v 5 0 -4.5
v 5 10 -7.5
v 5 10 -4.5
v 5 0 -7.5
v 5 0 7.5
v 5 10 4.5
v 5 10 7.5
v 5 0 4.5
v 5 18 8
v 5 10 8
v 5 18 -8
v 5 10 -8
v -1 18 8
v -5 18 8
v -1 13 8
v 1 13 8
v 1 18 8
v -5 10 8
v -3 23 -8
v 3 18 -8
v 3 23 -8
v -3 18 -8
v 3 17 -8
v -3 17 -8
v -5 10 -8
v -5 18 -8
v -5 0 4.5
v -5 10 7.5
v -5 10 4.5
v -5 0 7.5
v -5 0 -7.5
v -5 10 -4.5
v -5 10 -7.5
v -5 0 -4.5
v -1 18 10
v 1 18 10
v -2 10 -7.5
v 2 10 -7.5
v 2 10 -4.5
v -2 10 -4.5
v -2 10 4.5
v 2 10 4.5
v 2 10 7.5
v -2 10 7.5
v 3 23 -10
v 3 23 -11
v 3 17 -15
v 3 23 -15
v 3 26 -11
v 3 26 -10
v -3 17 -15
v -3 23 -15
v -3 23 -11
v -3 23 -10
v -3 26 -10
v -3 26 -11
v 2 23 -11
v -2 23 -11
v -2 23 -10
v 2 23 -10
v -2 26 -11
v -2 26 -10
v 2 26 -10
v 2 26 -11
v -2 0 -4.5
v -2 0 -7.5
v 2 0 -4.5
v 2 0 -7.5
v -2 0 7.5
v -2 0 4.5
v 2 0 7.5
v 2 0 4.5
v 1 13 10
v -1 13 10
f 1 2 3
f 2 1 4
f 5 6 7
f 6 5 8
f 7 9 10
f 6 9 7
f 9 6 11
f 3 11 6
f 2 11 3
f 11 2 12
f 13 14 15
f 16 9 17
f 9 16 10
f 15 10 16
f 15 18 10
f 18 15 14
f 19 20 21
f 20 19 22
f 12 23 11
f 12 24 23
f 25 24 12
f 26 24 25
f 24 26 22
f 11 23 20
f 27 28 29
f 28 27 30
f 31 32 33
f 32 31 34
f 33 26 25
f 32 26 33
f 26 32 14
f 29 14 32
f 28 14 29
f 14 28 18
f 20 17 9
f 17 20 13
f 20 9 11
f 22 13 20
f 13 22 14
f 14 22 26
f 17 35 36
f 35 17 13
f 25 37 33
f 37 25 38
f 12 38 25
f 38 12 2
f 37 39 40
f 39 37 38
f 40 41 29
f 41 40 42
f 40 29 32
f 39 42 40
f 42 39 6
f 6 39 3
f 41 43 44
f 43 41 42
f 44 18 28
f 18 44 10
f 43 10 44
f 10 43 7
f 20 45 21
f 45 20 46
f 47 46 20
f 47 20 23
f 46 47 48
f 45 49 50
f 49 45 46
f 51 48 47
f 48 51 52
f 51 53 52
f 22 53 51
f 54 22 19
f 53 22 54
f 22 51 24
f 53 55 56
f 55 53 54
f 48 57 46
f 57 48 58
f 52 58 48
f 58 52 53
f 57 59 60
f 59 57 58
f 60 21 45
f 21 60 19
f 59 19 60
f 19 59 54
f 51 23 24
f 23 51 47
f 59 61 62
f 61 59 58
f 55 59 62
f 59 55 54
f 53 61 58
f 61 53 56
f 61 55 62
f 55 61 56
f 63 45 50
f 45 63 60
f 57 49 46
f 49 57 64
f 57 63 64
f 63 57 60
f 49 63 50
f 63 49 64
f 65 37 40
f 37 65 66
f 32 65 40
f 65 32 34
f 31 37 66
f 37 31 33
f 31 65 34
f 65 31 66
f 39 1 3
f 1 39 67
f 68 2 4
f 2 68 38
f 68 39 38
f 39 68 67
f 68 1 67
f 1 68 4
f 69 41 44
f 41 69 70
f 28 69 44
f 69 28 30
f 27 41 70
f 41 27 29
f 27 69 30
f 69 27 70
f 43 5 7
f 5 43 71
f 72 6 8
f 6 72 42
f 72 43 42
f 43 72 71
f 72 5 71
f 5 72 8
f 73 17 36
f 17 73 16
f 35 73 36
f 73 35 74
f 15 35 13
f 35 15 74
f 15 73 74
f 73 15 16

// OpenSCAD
// file: lib.scad
// Voxcraft box-model library (OpenSCAD).
//
// Conventions: 1 unit = 1 texture pixel = 1/16 block. Origin = entity feet centre. +Y up,
// the model faces -Z (forward). Pivots are in model space.
//
// vx_bone() and vx_box() both produce geometry (so the model can be previewed/rendered and its
// geometry validated) AND echo a machine-readable record that tools/scad_export.py turns into
// the runtime box model. The .scad files are the single editable source of truth.

// Declare a bone: name, parent ("" = root), pivot point the bone rotates around.
module vx_bone(name, parent, pivot) {
    echo("VXBONE", name, parent, pivot);
    %translate(pivot) sphere(0.5, $fn = 6);   // preview-only marker
}

// A textured box attached to a bone. tex: texture for all faces; front: texture for the -Z face.
module vx_box(bone, min, size, tex, front = "") {
    echo("VXBOX", bone, min, size, tex, front == "" ? tex : front);
    translate(min) cube(size);
}
// main file
// Grazer: a calm four-legged herbivore of grasslands and forests. Original Voxcraft creature.
include <lib.scad>

vx_bone("body", "", [0, 14, 0]);
vx_bone("head", "body", [0, 19, -8]);
vx_bone("leg_fl", "body", [-3, 10, -6]);
vx_bone("leg_fr", "body", [ 3, 10, -6]);
vx_bone("leg_bl", "body", [-3, 10,  6]);
vx_bone("leg_br", "body", [ 3, 10,  6]);
vx_bone("tail", "body", [0, 17, 8]);

vx_box("body", [-5, 10, -8], [10, 8, 16], "grazer_hide");
vx_box("head", [-3, 17, -15], [6, 6, 7], "grazer_hide", "grazer_face");
vx_box("head", [-3, 23, -11], [1, 3, 1], "grazer_horn");
vx_box("head", [ 2, 23, -11], [1, 3, 1], "grazer_horn");
vx_box("leg_fl", [-5, 0, -7.5], [3, 10, 3], "grazer_leg");
vx_box("leg_fr", [ 2, 0, -7.5], [3, 10, 3], "grazer_leg");
vx_box("leg_bl", [-5, 0,  4.5], [3, 10, 3], "grazer_leg");
vx_box("leg_br", [ 2, 0,  4.5], [3, 10, 3], "grazer_leg");
vx_box("tail", [-1, 13, 8], [2, 5, 2], "grazer_hide");
